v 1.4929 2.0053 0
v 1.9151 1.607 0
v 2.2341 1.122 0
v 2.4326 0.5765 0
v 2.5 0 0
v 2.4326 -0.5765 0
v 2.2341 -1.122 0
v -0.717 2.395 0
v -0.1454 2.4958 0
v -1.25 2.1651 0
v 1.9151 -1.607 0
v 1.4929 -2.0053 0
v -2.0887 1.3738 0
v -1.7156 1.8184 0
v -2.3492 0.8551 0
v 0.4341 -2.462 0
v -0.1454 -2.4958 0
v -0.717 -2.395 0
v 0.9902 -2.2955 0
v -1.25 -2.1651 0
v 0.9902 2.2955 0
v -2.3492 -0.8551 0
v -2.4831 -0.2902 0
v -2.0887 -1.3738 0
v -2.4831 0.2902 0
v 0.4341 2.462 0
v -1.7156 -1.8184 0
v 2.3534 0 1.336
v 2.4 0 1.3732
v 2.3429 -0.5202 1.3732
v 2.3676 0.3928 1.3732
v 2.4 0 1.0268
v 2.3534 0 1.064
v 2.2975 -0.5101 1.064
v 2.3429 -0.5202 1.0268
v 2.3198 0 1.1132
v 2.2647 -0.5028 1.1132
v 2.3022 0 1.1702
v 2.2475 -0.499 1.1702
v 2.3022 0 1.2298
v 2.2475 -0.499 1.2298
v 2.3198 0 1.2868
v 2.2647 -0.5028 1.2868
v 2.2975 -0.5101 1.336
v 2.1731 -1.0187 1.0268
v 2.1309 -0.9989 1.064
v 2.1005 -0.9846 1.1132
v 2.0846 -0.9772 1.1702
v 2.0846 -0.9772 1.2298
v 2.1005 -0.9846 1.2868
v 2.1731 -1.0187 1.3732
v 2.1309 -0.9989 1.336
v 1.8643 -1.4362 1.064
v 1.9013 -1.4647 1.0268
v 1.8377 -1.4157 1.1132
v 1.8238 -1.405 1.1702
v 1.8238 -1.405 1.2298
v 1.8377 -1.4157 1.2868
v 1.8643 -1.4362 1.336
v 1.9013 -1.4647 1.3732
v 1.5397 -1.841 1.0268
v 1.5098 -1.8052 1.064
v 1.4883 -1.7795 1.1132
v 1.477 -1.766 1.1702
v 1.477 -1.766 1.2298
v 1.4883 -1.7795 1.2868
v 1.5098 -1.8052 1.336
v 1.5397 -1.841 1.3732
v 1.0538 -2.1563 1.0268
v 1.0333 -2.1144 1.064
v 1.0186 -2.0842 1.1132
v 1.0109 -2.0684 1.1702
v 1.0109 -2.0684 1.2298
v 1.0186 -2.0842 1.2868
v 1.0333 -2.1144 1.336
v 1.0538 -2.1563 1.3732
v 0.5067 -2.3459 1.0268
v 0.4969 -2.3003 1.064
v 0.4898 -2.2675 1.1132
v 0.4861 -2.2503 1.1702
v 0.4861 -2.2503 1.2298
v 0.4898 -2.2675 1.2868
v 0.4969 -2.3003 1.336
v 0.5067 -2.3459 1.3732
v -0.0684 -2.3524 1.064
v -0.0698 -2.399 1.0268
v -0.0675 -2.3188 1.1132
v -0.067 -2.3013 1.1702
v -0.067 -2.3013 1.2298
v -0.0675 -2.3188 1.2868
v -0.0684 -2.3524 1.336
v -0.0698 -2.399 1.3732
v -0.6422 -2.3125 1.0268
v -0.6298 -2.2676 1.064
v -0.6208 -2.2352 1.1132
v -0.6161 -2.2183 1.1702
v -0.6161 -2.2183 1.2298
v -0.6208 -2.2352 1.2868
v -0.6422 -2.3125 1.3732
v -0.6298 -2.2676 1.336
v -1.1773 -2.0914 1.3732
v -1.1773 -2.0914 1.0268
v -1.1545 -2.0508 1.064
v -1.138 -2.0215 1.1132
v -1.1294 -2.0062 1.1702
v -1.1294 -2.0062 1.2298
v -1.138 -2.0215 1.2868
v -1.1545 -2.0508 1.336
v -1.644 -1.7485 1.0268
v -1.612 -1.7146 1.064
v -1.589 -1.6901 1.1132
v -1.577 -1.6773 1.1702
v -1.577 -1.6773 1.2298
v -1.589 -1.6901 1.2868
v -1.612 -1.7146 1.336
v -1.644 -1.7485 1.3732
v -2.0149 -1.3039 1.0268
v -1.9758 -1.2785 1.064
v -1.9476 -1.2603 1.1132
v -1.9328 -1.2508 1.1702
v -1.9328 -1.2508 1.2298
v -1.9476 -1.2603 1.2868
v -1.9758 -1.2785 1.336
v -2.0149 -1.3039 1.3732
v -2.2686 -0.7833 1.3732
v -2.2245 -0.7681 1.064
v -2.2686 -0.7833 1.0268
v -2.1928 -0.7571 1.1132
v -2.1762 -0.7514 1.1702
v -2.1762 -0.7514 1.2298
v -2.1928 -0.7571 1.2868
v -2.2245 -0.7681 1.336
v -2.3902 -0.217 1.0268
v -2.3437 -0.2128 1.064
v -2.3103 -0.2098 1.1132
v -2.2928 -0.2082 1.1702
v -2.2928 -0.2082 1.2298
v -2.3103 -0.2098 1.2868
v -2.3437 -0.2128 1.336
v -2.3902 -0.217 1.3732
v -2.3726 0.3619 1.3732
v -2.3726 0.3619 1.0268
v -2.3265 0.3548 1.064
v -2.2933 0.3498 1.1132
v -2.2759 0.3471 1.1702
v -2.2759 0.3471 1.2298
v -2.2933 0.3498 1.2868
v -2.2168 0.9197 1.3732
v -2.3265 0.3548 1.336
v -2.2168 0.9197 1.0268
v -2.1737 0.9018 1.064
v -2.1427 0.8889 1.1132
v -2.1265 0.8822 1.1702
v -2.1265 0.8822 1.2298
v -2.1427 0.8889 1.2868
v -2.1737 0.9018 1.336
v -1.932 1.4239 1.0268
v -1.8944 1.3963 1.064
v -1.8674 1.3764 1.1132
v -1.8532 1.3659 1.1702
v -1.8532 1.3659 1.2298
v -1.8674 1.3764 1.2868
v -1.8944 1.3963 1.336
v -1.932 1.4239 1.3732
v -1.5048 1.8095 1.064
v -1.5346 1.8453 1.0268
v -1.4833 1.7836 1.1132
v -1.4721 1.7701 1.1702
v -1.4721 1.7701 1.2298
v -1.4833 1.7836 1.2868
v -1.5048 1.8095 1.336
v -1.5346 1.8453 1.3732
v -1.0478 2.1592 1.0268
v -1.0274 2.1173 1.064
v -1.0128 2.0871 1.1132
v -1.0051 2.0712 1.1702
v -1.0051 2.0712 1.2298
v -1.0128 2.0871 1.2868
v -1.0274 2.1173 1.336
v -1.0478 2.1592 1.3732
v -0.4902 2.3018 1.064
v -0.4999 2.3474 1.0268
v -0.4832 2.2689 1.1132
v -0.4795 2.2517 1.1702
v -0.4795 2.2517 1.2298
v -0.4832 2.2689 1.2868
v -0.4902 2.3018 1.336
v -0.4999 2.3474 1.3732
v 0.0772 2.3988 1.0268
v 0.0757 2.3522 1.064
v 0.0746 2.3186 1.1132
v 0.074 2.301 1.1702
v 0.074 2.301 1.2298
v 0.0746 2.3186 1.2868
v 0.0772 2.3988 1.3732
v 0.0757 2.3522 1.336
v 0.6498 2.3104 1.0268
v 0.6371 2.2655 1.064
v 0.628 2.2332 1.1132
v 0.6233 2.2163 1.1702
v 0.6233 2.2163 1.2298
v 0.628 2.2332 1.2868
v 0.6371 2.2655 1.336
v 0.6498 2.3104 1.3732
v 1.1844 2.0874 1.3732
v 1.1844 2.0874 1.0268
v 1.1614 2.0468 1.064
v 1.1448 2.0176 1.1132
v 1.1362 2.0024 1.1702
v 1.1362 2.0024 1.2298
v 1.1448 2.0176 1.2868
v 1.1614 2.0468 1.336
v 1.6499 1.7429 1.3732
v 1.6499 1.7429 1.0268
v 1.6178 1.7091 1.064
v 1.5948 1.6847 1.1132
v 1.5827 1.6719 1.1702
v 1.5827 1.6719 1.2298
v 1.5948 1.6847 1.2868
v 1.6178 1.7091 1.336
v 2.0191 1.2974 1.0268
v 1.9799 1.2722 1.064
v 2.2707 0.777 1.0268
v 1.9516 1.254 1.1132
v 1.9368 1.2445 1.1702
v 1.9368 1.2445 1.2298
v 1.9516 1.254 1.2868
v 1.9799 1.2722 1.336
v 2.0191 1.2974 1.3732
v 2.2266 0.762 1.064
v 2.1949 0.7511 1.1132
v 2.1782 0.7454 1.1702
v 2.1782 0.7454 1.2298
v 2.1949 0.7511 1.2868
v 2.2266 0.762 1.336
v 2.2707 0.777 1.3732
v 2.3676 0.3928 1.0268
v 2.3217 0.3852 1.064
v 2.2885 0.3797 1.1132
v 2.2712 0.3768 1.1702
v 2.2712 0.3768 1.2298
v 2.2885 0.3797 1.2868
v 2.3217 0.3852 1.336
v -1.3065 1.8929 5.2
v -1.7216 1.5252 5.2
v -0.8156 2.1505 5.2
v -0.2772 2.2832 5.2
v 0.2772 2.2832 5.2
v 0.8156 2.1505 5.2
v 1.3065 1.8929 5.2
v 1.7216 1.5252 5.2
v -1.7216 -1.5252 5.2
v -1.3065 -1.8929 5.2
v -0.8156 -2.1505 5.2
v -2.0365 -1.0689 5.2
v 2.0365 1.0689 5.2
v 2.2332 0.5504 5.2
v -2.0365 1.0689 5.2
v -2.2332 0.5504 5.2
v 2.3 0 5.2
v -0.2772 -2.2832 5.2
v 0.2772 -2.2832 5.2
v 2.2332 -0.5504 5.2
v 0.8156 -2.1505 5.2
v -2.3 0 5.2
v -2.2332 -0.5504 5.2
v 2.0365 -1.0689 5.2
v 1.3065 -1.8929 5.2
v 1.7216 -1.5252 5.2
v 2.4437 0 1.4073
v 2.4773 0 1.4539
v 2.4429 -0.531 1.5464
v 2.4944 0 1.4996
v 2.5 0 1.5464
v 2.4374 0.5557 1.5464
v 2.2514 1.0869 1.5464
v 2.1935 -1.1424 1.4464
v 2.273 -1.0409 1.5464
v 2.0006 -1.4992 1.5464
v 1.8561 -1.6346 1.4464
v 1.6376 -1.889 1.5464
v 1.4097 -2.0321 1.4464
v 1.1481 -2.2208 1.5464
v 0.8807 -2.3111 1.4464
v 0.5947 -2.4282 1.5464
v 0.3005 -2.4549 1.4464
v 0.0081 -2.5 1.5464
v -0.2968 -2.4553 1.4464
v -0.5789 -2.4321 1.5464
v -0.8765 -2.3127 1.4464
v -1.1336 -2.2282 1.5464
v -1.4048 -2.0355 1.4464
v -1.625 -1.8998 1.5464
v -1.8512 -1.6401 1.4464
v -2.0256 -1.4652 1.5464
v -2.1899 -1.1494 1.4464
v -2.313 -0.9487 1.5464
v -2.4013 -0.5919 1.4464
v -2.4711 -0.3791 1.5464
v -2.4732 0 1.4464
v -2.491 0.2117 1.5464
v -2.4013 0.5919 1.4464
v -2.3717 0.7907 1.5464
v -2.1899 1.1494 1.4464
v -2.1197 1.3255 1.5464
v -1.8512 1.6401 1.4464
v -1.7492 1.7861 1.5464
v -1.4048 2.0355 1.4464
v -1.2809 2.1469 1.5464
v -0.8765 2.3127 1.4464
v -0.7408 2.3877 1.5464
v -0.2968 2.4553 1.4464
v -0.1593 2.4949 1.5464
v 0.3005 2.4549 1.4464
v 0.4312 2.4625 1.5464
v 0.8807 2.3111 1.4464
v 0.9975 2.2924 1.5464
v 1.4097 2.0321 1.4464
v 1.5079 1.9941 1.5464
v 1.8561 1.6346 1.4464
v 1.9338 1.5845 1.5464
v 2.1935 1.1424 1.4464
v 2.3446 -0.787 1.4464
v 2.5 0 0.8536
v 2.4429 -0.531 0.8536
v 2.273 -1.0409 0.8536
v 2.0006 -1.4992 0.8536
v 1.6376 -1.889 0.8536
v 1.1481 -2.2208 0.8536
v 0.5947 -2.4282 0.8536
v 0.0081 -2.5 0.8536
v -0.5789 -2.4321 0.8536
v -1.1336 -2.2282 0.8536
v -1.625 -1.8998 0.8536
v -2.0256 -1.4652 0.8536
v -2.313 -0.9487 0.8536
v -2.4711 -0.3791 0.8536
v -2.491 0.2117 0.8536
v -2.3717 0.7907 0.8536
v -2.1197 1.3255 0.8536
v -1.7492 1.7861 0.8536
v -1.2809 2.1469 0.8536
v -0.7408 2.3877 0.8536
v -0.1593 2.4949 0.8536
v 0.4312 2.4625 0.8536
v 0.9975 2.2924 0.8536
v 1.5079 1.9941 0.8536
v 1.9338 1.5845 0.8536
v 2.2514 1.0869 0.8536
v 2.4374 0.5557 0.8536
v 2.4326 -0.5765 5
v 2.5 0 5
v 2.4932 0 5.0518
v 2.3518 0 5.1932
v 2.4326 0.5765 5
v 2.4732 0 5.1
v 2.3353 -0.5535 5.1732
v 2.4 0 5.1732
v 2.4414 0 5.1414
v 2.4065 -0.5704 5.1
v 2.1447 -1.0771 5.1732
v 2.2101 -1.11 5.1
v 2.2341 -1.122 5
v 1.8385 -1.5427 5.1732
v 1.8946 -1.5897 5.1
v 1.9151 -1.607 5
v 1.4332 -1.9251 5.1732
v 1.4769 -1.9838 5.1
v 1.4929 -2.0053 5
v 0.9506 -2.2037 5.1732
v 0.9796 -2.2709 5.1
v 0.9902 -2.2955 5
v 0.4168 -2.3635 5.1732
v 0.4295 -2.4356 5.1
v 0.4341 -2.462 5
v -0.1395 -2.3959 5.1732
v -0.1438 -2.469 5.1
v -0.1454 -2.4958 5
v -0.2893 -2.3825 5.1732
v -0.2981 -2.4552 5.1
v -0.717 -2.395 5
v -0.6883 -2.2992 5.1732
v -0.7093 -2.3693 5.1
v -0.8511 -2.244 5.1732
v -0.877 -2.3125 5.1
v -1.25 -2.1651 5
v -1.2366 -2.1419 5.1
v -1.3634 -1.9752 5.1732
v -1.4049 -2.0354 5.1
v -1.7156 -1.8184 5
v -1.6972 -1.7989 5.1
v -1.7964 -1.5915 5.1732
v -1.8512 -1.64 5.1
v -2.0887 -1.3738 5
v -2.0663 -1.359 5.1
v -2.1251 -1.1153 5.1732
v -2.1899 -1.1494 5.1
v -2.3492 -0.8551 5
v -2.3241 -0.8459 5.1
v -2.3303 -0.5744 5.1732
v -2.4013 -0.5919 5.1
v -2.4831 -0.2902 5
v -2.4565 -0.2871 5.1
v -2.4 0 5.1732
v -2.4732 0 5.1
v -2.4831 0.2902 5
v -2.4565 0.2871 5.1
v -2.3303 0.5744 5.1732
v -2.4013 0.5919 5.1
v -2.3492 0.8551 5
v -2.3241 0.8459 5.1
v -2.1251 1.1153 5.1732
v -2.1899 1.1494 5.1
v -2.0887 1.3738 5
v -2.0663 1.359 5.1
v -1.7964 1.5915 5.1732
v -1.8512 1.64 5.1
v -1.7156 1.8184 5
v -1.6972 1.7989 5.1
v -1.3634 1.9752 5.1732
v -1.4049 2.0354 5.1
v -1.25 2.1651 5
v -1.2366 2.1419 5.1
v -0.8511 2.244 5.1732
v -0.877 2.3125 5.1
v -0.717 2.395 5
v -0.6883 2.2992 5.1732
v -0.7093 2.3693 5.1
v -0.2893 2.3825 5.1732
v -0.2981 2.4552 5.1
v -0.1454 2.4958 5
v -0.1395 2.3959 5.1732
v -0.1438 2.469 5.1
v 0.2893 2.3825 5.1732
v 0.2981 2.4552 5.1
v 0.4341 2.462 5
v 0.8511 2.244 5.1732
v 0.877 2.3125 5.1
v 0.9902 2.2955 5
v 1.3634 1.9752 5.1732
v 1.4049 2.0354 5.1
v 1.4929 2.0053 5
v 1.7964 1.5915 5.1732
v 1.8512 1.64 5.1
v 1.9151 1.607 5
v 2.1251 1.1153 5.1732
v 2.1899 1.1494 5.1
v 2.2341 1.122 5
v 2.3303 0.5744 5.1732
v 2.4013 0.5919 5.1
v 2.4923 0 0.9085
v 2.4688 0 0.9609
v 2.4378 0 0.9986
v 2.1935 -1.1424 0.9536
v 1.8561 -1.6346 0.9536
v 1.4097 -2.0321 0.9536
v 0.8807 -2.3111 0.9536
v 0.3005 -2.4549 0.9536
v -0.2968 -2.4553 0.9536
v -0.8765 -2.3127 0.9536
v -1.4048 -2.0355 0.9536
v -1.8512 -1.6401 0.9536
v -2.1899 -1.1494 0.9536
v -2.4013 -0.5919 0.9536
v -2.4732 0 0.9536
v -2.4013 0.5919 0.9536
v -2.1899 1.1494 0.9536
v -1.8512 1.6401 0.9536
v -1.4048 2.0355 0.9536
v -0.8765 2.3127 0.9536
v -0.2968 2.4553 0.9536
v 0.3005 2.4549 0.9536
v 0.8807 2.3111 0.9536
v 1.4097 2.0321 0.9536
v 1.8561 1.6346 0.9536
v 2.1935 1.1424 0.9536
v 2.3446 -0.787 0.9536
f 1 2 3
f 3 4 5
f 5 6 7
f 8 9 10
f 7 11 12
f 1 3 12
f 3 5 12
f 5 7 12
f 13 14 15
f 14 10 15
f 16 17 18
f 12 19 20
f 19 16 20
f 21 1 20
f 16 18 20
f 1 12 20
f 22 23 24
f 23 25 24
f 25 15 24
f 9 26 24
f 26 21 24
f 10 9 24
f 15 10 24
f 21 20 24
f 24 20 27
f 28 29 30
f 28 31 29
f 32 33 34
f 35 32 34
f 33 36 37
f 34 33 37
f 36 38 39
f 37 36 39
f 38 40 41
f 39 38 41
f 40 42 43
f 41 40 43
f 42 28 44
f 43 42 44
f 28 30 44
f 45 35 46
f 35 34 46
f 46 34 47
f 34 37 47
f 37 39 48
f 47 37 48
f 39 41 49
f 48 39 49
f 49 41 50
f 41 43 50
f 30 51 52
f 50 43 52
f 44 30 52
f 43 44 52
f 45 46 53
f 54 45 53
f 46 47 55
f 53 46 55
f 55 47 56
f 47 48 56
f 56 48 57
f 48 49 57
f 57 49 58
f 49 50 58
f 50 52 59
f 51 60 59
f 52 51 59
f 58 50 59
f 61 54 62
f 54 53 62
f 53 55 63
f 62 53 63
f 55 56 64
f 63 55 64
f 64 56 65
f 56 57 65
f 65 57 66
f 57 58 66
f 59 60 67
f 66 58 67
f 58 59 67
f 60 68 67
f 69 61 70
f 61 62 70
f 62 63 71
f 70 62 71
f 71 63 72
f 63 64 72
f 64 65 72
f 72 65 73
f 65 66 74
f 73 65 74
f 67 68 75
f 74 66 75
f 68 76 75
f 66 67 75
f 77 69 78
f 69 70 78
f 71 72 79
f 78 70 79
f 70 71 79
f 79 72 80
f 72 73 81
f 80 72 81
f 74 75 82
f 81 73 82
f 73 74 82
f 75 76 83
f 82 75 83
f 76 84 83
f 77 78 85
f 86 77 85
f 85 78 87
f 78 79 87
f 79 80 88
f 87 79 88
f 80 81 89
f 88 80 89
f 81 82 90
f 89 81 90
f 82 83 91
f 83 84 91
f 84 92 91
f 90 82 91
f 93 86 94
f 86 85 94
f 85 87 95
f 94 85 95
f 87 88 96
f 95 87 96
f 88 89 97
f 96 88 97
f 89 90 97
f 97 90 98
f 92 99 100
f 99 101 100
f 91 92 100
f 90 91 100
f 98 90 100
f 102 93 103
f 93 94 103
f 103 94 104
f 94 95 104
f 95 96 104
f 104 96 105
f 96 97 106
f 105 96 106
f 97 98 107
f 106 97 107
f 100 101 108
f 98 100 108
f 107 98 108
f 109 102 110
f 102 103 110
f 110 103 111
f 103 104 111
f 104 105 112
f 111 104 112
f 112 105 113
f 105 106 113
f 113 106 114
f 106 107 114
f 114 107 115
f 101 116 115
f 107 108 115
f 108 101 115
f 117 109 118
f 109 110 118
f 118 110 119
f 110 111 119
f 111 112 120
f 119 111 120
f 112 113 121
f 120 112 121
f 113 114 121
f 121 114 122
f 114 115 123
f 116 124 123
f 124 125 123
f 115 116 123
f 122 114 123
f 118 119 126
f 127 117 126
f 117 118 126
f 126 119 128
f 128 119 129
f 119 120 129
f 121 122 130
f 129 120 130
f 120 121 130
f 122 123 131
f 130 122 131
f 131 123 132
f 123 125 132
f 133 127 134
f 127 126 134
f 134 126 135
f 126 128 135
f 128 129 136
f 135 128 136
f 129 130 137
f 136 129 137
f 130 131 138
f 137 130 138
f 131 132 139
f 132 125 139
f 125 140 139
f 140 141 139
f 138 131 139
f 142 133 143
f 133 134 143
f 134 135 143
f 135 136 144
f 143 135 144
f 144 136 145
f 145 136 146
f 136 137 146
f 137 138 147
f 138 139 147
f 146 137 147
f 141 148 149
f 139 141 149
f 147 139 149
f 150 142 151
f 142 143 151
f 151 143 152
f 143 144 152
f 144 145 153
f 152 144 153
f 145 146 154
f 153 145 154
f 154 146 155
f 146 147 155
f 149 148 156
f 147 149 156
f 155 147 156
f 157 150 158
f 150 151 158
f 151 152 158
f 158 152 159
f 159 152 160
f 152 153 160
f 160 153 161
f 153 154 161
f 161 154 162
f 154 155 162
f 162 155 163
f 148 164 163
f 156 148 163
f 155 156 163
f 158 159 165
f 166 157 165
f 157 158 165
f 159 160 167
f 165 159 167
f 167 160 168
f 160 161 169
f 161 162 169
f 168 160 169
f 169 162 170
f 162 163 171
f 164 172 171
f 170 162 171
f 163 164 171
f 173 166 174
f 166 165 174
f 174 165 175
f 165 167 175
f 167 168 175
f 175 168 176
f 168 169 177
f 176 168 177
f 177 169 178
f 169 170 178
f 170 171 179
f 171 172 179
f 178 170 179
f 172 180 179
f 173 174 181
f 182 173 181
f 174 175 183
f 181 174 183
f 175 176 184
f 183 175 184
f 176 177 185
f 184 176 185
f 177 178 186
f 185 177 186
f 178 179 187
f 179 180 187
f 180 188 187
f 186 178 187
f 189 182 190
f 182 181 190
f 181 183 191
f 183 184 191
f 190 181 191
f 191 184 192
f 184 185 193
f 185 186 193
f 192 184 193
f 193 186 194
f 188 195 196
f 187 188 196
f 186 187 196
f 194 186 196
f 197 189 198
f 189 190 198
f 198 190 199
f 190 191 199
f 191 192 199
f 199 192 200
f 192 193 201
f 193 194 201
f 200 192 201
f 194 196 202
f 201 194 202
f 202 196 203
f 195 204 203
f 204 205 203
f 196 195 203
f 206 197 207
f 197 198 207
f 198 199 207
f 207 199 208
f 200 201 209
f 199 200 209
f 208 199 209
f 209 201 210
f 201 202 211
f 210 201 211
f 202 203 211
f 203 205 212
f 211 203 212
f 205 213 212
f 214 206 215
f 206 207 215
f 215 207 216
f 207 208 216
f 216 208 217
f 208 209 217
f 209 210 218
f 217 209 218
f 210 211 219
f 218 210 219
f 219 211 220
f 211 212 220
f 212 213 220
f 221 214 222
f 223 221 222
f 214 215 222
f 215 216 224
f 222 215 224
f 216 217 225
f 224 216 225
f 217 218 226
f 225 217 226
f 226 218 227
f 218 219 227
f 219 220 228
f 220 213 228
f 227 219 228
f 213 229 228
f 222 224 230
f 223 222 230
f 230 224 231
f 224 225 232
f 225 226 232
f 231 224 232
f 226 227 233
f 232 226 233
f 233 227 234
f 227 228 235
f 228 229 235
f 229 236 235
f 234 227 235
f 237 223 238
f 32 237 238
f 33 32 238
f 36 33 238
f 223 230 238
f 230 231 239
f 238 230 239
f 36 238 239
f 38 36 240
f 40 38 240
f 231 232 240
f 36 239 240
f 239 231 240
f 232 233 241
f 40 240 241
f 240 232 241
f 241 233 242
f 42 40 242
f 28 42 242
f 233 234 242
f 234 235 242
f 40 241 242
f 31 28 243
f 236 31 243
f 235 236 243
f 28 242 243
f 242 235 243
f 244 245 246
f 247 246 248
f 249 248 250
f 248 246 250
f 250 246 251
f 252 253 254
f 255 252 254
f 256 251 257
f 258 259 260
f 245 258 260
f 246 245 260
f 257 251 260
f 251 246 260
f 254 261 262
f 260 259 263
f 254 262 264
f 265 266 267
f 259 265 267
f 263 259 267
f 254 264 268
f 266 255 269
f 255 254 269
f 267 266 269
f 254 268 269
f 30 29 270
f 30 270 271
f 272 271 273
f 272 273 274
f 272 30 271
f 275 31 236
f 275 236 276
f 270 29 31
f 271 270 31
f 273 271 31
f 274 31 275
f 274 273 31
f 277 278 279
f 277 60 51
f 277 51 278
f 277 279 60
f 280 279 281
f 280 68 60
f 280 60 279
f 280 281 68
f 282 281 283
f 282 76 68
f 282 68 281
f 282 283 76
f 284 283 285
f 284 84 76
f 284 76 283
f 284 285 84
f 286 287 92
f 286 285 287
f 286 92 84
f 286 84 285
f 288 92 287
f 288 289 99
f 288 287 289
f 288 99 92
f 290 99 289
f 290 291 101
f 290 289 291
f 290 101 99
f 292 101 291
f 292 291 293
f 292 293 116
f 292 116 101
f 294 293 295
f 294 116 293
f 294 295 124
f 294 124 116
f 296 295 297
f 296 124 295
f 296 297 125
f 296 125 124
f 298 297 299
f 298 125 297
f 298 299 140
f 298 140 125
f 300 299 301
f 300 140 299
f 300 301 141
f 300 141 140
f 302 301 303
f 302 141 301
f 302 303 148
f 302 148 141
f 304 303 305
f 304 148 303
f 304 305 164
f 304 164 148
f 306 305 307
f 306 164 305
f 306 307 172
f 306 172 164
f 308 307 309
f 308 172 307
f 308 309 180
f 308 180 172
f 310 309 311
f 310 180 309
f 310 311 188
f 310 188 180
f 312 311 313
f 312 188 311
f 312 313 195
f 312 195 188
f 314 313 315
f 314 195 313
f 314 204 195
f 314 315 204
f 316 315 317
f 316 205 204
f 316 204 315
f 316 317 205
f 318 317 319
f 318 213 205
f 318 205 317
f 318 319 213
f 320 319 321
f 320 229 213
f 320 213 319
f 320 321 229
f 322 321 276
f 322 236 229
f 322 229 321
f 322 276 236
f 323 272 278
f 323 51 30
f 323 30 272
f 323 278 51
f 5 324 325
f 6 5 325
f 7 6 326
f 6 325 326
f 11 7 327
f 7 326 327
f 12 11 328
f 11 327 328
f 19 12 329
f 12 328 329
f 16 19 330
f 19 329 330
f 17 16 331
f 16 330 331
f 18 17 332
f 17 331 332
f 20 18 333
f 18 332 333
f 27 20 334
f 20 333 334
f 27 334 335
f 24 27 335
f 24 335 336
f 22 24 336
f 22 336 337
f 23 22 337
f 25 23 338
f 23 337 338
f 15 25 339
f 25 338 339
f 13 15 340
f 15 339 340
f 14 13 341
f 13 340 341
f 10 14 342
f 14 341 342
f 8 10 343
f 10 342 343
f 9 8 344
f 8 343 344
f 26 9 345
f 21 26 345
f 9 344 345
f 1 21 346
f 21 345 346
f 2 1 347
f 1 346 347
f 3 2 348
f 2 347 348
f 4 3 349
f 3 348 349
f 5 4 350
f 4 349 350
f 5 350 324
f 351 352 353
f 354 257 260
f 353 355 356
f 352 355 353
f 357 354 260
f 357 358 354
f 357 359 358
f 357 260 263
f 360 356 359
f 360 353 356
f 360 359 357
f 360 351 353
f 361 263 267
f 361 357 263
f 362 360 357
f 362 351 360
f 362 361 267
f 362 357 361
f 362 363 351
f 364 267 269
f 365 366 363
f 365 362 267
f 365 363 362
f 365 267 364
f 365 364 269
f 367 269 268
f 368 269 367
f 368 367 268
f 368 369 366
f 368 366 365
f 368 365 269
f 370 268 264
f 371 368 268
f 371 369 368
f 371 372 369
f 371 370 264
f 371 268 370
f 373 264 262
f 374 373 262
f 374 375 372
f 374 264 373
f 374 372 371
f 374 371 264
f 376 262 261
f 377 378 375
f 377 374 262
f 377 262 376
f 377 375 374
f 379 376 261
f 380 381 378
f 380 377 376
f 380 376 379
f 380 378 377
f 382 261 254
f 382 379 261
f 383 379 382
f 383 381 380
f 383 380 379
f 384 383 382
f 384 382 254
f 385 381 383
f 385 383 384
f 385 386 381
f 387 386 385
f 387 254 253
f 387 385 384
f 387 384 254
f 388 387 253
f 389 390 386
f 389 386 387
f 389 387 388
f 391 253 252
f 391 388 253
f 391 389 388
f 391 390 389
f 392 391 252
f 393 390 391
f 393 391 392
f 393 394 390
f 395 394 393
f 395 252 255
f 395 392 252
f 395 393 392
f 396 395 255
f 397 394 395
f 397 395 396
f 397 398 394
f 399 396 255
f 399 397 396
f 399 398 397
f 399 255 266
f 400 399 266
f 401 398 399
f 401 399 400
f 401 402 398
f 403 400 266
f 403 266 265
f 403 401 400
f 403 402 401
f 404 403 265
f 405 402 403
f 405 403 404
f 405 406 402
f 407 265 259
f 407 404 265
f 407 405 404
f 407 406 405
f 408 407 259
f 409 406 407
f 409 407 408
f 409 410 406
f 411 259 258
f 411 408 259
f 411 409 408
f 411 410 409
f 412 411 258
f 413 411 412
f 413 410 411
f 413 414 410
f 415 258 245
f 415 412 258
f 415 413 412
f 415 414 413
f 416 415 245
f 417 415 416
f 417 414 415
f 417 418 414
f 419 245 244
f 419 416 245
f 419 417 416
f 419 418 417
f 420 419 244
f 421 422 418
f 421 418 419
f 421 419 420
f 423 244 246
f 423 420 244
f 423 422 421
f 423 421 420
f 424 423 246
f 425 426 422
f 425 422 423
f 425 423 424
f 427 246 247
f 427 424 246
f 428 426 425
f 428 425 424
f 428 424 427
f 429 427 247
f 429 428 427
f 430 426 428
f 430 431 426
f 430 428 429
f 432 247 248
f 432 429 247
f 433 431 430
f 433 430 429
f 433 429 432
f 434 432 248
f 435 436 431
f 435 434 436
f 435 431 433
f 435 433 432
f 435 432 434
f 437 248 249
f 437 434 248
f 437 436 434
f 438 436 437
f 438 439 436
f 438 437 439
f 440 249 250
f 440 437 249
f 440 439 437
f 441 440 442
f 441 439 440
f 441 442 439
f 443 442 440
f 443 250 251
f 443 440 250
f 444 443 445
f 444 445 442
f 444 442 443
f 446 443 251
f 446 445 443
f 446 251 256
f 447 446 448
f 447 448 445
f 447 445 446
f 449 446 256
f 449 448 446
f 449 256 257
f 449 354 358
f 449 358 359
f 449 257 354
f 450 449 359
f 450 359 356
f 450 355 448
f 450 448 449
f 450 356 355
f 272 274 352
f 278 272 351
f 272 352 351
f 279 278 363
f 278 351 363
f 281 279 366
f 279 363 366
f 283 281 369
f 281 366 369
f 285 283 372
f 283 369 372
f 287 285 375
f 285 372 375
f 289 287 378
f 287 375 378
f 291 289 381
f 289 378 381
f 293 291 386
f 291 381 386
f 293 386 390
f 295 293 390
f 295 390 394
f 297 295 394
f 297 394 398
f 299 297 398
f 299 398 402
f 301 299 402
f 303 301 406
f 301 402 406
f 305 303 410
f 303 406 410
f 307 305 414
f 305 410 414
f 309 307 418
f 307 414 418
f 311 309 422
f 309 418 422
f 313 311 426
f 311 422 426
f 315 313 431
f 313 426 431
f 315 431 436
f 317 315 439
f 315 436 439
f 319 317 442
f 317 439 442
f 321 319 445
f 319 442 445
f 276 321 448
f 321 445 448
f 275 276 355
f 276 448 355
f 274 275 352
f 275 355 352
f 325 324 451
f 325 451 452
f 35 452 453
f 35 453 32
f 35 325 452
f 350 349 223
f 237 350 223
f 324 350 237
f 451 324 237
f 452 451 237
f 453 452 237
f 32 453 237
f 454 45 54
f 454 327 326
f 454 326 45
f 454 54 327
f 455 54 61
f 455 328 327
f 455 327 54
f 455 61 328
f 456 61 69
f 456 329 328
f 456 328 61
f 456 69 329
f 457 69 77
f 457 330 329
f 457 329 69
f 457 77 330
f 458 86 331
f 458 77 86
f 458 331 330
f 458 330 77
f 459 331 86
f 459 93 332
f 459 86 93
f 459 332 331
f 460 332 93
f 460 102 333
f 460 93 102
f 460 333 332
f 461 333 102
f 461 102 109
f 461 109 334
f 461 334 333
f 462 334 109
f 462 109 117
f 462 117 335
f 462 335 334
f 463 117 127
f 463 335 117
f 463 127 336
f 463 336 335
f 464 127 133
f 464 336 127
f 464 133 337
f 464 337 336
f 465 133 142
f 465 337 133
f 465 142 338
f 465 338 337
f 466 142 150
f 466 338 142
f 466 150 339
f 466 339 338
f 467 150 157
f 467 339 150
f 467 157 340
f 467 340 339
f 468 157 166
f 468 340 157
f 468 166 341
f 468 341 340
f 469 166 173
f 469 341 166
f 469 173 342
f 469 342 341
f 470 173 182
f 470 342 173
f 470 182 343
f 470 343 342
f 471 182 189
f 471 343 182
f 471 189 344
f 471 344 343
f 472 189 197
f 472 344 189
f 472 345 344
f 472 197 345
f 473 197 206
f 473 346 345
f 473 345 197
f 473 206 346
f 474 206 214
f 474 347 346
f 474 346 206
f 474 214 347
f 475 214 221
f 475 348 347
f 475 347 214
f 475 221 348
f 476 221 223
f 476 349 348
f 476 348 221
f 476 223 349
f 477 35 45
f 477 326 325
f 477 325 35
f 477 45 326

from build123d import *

# Parameters (mm, degrees)
F2_R = 0.2


with BuildPart() as f1:
    # F0 (on Front) → F1 (revolve)
    with BuildSketch(Plane.XZ):
        with BuildLine():
            Line((2.5, 5.2), (0, 5.2))
            Line((0, 5.2), (0, 0))
            Line((0, 0), (2.5, 0))
            Line((2.5, 0), (2.5, 1))
            ThreePointArc((2.5, 1), (2.3, 1.2), (2.5, 1.4))
            Line((2.5, 1.4), (2.5, 5.2))
        make_face()
    revolve(axis=Axis((0, 0, 6.706364), (0, 0, -1)))

    # F2
    f2_edges = [f1.edges().sort_by_distance(p)[0] for p in [
        (-2.5, 0, 1.4),
        (-2.5, 0, 1),
        (-2.5, 0, 5.2),
    ]]
    fillet(f2_edges, radius=F2_R)


solid = f1.part
